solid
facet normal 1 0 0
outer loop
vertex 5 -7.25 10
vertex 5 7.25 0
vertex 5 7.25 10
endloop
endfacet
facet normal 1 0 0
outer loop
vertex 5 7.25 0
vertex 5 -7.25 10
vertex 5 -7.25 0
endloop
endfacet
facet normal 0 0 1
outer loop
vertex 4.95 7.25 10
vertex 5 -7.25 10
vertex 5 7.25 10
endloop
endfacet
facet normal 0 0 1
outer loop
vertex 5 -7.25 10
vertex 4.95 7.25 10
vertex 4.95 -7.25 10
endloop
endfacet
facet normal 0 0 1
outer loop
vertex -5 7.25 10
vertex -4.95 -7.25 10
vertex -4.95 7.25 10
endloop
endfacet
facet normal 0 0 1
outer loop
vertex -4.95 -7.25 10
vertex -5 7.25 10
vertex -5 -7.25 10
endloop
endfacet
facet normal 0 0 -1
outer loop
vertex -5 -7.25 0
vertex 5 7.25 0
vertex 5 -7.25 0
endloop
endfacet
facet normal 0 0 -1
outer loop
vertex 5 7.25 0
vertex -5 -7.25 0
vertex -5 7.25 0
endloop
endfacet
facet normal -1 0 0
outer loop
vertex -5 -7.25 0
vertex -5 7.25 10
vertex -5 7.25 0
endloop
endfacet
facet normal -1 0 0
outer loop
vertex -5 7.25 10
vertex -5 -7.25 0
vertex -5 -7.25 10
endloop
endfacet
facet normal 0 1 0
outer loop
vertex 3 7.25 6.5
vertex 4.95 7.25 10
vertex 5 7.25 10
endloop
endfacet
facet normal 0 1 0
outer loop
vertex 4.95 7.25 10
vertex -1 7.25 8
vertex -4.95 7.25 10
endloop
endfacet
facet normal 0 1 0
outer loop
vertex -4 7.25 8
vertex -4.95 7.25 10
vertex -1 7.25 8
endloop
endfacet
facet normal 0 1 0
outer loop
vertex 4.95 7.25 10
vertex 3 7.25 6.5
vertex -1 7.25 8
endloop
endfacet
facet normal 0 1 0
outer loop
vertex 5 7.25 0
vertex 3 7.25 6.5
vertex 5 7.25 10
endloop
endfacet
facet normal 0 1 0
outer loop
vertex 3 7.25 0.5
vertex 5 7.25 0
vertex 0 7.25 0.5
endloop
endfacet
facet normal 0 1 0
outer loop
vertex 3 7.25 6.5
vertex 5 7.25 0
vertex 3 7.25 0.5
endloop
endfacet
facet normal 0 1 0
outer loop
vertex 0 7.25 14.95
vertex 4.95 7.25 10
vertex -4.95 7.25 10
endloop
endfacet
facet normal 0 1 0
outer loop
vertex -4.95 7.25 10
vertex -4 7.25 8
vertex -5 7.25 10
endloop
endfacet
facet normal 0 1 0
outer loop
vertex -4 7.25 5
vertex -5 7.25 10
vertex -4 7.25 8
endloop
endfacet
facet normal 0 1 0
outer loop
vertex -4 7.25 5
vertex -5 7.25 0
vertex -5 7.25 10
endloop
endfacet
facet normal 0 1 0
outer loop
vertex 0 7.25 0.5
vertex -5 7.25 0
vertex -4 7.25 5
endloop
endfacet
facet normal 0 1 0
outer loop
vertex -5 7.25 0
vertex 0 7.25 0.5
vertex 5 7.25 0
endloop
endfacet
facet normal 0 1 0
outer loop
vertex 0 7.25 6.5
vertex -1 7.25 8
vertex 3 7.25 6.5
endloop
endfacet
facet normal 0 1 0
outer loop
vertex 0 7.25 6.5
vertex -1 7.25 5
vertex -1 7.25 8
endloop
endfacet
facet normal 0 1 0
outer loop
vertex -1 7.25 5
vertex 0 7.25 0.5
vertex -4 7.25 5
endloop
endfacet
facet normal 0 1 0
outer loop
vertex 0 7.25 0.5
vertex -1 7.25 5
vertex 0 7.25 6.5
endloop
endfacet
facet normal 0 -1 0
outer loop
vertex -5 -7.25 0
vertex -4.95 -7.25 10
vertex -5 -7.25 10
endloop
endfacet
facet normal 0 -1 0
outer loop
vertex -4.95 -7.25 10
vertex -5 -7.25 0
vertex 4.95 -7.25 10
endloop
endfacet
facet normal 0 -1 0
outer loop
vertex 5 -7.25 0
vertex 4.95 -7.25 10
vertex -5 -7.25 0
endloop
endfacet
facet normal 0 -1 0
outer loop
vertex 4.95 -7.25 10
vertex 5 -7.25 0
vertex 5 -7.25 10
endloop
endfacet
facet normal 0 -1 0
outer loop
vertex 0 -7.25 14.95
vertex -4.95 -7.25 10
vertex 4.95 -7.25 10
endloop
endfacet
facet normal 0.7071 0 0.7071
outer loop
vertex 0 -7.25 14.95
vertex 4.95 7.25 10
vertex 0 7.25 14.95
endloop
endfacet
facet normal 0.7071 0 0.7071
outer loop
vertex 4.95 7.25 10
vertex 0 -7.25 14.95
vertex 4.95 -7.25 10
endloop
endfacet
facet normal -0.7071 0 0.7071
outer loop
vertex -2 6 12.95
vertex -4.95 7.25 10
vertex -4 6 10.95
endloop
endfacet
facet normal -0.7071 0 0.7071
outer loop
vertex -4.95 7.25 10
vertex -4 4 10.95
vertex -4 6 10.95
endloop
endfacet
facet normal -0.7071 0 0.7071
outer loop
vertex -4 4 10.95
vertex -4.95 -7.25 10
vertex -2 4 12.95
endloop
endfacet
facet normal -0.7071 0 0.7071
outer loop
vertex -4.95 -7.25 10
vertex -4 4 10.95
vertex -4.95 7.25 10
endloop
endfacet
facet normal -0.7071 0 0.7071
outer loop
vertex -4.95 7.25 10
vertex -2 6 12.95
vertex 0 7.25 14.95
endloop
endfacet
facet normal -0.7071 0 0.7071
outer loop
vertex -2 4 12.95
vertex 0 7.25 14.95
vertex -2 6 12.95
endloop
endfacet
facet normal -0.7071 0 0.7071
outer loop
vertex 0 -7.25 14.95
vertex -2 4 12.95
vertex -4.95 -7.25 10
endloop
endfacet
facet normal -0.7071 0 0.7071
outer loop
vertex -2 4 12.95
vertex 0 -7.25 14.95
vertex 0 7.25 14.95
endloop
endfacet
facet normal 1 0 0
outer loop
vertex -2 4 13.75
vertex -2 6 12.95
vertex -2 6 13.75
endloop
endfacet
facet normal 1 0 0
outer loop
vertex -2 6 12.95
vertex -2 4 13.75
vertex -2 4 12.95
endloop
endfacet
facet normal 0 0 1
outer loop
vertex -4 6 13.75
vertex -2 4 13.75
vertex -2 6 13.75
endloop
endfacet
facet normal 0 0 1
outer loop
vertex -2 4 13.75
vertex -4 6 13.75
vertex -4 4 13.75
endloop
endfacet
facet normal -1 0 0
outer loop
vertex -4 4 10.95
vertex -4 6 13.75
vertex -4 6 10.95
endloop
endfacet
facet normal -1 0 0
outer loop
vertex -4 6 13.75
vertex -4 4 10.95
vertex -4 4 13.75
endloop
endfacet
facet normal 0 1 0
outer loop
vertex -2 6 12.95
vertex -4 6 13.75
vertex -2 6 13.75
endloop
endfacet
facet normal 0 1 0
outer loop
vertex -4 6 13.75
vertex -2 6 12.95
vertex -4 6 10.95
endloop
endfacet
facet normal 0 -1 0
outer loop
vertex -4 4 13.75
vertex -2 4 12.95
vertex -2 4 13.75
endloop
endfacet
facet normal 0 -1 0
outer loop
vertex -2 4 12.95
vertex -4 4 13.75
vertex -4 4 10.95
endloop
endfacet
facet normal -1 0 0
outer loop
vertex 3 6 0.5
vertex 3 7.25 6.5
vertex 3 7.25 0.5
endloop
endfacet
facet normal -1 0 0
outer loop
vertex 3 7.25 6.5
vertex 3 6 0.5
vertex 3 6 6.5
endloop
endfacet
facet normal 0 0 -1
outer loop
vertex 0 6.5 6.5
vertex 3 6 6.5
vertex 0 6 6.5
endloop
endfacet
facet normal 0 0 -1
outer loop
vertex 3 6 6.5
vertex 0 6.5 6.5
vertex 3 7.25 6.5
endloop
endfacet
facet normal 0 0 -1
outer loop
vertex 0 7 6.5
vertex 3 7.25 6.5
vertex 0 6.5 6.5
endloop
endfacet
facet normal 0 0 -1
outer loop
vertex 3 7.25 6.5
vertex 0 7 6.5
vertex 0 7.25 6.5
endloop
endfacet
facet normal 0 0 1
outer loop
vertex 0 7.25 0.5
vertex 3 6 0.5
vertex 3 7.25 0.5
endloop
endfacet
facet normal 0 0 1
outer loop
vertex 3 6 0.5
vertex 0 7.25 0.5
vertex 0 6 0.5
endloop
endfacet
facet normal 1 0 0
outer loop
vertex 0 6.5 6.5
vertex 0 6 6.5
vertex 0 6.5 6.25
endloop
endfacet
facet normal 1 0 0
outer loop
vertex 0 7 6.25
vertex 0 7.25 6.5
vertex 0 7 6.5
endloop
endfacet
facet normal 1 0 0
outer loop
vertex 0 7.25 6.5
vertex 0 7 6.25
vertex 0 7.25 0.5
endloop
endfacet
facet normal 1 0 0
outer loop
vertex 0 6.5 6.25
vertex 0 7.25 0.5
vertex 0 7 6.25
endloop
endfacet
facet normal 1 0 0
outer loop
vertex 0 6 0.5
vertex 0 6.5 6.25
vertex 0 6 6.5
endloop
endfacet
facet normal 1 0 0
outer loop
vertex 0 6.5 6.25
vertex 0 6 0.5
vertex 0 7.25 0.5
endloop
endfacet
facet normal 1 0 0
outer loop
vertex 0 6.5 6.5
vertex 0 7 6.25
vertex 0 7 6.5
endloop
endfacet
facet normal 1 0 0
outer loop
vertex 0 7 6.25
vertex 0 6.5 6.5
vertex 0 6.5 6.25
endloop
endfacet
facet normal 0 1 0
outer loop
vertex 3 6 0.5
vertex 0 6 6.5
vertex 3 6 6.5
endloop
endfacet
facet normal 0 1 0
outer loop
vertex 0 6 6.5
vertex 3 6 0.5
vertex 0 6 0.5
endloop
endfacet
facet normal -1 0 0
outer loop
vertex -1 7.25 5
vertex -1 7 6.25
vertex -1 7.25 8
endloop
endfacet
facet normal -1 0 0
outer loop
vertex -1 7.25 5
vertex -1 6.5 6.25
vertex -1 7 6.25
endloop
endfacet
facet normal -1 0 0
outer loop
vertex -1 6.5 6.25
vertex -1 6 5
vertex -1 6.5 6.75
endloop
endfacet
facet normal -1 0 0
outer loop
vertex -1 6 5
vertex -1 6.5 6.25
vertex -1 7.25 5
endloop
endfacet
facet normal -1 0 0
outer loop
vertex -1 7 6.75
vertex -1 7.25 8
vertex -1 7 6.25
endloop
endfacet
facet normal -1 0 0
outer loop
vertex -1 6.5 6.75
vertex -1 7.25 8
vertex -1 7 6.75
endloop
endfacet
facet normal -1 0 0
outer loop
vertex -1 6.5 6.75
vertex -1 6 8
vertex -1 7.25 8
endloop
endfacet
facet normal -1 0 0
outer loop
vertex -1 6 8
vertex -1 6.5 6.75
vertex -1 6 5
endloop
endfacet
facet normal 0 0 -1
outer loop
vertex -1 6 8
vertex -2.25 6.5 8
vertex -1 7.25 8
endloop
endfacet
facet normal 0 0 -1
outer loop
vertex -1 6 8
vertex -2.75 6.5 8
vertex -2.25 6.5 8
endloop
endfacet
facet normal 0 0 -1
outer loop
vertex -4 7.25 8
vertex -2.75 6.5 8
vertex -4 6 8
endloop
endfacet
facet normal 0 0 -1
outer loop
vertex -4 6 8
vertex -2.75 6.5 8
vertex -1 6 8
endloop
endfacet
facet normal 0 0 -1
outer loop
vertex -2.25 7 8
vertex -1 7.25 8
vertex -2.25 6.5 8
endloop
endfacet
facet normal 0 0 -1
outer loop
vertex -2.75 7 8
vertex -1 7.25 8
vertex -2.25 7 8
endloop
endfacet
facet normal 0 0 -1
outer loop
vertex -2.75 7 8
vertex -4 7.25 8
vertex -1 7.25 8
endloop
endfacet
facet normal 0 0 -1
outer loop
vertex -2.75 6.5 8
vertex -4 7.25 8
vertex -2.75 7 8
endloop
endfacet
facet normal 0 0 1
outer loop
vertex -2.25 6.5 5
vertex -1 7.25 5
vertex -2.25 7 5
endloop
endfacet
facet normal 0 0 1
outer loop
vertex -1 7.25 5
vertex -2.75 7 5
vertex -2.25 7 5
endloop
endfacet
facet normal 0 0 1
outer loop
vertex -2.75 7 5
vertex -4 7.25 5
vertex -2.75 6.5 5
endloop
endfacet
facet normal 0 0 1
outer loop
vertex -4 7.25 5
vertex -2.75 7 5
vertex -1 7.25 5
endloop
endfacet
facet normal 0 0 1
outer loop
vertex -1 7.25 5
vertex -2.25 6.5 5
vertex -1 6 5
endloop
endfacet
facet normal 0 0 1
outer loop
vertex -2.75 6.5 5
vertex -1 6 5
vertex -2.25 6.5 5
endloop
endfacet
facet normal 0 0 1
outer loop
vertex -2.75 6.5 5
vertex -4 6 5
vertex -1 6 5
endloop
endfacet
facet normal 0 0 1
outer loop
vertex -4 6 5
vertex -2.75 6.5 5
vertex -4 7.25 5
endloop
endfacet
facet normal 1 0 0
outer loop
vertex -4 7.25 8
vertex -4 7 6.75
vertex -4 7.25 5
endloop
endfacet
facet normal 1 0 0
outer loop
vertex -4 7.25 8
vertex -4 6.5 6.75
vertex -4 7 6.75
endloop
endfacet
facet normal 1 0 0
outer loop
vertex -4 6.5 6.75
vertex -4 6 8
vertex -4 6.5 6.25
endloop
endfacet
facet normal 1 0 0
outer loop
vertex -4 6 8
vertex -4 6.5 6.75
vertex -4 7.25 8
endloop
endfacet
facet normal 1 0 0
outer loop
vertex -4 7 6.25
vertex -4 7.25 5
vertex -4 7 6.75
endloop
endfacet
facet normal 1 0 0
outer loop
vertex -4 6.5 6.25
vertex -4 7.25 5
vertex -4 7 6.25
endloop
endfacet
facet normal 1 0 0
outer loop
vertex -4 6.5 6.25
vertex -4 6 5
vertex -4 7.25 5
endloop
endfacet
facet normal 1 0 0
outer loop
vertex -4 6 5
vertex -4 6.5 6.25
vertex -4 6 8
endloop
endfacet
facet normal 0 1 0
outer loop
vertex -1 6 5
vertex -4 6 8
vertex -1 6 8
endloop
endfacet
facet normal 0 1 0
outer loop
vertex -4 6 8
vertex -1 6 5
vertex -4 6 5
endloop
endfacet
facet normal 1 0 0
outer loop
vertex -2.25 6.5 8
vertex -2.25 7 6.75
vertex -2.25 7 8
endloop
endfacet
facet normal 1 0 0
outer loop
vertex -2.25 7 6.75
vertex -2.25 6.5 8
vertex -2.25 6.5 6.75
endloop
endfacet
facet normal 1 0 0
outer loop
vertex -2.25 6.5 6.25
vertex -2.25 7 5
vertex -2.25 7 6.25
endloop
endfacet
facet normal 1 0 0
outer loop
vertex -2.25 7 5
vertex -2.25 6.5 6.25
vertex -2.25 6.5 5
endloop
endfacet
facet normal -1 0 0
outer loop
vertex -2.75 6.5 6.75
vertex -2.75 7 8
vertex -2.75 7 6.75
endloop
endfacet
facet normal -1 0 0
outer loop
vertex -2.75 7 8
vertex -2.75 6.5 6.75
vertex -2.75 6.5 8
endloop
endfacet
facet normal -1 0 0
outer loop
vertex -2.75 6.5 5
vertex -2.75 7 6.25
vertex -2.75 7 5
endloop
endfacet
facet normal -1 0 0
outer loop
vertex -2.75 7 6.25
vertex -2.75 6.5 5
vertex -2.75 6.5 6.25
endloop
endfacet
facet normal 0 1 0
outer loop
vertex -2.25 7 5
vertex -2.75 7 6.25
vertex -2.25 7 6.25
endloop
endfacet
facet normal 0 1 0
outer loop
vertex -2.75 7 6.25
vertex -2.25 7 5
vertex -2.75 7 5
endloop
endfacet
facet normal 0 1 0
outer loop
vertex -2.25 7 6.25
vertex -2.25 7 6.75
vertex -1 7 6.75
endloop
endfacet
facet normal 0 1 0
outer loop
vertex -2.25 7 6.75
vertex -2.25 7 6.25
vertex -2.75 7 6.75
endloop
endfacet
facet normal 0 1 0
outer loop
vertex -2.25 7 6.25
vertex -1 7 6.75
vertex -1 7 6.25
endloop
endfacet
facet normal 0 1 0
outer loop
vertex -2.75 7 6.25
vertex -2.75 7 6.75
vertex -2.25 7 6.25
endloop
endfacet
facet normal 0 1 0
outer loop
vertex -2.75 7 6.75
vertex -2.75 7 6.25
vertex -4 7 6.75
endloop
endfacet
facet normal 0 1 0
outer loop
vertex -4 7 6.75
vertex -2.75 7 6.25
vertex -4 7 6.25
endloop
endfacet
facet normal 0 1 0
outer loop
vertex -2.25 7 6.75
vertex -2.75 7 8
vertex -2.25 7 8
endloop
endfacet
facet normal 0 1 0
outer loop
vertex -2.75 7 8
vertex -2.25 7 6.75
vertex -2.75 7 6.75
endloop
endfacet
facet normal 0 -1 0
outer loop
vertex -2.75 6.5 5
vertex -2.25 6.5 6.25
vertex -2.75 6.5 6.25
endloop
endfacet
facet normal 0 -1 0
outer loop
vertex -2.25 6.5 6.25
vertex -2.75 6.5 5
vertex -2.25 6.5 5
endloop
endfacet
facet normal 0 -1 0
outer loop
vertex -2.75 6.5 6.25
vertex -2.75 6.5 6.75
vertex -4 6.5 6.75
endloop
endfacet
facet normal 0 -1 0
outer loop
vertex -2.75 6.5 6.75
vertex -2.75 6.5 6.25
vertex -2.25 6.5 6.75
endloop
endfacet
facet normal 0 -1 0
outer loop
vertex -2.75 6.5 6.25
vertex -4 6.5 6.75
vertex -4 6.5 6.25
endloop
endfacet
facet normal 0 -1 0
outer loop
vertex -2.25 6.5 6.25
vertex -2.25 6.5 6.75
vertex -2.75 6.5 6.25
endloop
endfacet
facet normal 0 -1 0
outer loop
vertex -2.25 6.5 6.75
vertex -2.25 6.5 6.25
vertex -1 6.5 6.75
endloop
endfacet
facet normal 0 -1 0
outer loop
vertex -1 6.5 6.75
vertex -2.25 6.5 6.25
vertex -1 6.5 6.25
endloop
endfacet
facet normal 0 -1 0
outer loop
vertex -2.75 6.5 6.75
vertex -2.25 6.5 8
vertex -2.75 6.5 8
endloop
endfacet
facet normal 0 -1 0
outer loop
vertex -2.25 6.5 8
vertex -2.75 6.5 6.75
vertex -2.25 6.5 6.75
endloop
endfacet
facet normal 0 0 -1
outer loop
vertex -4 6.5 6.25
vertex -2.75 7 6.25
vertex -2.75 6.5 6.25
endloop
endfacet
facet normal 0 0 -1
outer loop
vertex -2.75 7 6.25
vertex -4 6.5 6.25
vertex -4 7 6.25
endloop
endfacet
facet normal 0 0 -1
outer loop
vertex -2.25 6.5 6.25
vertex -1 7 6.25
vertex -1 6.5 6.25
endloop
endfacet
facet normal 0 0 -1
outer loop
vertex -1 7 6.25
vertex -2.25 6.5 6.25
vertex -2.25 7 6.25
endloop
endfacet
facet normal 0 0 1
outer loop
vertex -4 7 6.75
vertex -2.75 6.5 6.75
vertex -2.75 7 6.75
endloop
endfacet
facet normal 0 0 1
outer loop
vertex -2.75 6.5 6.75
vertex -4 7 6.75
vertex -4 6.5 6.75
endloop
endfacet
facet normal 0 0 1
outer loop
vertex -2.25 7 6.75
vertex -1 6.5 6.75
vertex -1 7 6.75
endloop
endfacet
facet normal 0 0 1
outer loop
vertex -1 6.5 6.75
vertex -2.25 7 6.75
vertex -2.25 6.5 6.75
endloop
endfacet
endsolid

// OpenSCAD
    difference(){
    translate([0,0,5]){color("orange") cube([10, 14.5, 10],center=true);
    translate([0,0,5])rotate([0,45,0])color("orange") cube([7, 14.5, 7],center=true);
   translate([-3,5,7])color("orange") cube([2, 2, 3.5],center=true);
   translate([0,0,5])rotate([0,-45,0])color("orange") cube([7, 14.5, 7],center=true);
    }
   translate([0,6,0.5])cube([3,4,6]);
   translate([-4,6,5])cube([3,3,3]);}
   translate([-2.5,6.75,7])color("orange") cube([.5, .5, 5],center=true);
   translate([-2.5,6.75,6.5])rotate([0,-90,0])color("orange") cube([.5, .5, 5],center=true);
    
    
